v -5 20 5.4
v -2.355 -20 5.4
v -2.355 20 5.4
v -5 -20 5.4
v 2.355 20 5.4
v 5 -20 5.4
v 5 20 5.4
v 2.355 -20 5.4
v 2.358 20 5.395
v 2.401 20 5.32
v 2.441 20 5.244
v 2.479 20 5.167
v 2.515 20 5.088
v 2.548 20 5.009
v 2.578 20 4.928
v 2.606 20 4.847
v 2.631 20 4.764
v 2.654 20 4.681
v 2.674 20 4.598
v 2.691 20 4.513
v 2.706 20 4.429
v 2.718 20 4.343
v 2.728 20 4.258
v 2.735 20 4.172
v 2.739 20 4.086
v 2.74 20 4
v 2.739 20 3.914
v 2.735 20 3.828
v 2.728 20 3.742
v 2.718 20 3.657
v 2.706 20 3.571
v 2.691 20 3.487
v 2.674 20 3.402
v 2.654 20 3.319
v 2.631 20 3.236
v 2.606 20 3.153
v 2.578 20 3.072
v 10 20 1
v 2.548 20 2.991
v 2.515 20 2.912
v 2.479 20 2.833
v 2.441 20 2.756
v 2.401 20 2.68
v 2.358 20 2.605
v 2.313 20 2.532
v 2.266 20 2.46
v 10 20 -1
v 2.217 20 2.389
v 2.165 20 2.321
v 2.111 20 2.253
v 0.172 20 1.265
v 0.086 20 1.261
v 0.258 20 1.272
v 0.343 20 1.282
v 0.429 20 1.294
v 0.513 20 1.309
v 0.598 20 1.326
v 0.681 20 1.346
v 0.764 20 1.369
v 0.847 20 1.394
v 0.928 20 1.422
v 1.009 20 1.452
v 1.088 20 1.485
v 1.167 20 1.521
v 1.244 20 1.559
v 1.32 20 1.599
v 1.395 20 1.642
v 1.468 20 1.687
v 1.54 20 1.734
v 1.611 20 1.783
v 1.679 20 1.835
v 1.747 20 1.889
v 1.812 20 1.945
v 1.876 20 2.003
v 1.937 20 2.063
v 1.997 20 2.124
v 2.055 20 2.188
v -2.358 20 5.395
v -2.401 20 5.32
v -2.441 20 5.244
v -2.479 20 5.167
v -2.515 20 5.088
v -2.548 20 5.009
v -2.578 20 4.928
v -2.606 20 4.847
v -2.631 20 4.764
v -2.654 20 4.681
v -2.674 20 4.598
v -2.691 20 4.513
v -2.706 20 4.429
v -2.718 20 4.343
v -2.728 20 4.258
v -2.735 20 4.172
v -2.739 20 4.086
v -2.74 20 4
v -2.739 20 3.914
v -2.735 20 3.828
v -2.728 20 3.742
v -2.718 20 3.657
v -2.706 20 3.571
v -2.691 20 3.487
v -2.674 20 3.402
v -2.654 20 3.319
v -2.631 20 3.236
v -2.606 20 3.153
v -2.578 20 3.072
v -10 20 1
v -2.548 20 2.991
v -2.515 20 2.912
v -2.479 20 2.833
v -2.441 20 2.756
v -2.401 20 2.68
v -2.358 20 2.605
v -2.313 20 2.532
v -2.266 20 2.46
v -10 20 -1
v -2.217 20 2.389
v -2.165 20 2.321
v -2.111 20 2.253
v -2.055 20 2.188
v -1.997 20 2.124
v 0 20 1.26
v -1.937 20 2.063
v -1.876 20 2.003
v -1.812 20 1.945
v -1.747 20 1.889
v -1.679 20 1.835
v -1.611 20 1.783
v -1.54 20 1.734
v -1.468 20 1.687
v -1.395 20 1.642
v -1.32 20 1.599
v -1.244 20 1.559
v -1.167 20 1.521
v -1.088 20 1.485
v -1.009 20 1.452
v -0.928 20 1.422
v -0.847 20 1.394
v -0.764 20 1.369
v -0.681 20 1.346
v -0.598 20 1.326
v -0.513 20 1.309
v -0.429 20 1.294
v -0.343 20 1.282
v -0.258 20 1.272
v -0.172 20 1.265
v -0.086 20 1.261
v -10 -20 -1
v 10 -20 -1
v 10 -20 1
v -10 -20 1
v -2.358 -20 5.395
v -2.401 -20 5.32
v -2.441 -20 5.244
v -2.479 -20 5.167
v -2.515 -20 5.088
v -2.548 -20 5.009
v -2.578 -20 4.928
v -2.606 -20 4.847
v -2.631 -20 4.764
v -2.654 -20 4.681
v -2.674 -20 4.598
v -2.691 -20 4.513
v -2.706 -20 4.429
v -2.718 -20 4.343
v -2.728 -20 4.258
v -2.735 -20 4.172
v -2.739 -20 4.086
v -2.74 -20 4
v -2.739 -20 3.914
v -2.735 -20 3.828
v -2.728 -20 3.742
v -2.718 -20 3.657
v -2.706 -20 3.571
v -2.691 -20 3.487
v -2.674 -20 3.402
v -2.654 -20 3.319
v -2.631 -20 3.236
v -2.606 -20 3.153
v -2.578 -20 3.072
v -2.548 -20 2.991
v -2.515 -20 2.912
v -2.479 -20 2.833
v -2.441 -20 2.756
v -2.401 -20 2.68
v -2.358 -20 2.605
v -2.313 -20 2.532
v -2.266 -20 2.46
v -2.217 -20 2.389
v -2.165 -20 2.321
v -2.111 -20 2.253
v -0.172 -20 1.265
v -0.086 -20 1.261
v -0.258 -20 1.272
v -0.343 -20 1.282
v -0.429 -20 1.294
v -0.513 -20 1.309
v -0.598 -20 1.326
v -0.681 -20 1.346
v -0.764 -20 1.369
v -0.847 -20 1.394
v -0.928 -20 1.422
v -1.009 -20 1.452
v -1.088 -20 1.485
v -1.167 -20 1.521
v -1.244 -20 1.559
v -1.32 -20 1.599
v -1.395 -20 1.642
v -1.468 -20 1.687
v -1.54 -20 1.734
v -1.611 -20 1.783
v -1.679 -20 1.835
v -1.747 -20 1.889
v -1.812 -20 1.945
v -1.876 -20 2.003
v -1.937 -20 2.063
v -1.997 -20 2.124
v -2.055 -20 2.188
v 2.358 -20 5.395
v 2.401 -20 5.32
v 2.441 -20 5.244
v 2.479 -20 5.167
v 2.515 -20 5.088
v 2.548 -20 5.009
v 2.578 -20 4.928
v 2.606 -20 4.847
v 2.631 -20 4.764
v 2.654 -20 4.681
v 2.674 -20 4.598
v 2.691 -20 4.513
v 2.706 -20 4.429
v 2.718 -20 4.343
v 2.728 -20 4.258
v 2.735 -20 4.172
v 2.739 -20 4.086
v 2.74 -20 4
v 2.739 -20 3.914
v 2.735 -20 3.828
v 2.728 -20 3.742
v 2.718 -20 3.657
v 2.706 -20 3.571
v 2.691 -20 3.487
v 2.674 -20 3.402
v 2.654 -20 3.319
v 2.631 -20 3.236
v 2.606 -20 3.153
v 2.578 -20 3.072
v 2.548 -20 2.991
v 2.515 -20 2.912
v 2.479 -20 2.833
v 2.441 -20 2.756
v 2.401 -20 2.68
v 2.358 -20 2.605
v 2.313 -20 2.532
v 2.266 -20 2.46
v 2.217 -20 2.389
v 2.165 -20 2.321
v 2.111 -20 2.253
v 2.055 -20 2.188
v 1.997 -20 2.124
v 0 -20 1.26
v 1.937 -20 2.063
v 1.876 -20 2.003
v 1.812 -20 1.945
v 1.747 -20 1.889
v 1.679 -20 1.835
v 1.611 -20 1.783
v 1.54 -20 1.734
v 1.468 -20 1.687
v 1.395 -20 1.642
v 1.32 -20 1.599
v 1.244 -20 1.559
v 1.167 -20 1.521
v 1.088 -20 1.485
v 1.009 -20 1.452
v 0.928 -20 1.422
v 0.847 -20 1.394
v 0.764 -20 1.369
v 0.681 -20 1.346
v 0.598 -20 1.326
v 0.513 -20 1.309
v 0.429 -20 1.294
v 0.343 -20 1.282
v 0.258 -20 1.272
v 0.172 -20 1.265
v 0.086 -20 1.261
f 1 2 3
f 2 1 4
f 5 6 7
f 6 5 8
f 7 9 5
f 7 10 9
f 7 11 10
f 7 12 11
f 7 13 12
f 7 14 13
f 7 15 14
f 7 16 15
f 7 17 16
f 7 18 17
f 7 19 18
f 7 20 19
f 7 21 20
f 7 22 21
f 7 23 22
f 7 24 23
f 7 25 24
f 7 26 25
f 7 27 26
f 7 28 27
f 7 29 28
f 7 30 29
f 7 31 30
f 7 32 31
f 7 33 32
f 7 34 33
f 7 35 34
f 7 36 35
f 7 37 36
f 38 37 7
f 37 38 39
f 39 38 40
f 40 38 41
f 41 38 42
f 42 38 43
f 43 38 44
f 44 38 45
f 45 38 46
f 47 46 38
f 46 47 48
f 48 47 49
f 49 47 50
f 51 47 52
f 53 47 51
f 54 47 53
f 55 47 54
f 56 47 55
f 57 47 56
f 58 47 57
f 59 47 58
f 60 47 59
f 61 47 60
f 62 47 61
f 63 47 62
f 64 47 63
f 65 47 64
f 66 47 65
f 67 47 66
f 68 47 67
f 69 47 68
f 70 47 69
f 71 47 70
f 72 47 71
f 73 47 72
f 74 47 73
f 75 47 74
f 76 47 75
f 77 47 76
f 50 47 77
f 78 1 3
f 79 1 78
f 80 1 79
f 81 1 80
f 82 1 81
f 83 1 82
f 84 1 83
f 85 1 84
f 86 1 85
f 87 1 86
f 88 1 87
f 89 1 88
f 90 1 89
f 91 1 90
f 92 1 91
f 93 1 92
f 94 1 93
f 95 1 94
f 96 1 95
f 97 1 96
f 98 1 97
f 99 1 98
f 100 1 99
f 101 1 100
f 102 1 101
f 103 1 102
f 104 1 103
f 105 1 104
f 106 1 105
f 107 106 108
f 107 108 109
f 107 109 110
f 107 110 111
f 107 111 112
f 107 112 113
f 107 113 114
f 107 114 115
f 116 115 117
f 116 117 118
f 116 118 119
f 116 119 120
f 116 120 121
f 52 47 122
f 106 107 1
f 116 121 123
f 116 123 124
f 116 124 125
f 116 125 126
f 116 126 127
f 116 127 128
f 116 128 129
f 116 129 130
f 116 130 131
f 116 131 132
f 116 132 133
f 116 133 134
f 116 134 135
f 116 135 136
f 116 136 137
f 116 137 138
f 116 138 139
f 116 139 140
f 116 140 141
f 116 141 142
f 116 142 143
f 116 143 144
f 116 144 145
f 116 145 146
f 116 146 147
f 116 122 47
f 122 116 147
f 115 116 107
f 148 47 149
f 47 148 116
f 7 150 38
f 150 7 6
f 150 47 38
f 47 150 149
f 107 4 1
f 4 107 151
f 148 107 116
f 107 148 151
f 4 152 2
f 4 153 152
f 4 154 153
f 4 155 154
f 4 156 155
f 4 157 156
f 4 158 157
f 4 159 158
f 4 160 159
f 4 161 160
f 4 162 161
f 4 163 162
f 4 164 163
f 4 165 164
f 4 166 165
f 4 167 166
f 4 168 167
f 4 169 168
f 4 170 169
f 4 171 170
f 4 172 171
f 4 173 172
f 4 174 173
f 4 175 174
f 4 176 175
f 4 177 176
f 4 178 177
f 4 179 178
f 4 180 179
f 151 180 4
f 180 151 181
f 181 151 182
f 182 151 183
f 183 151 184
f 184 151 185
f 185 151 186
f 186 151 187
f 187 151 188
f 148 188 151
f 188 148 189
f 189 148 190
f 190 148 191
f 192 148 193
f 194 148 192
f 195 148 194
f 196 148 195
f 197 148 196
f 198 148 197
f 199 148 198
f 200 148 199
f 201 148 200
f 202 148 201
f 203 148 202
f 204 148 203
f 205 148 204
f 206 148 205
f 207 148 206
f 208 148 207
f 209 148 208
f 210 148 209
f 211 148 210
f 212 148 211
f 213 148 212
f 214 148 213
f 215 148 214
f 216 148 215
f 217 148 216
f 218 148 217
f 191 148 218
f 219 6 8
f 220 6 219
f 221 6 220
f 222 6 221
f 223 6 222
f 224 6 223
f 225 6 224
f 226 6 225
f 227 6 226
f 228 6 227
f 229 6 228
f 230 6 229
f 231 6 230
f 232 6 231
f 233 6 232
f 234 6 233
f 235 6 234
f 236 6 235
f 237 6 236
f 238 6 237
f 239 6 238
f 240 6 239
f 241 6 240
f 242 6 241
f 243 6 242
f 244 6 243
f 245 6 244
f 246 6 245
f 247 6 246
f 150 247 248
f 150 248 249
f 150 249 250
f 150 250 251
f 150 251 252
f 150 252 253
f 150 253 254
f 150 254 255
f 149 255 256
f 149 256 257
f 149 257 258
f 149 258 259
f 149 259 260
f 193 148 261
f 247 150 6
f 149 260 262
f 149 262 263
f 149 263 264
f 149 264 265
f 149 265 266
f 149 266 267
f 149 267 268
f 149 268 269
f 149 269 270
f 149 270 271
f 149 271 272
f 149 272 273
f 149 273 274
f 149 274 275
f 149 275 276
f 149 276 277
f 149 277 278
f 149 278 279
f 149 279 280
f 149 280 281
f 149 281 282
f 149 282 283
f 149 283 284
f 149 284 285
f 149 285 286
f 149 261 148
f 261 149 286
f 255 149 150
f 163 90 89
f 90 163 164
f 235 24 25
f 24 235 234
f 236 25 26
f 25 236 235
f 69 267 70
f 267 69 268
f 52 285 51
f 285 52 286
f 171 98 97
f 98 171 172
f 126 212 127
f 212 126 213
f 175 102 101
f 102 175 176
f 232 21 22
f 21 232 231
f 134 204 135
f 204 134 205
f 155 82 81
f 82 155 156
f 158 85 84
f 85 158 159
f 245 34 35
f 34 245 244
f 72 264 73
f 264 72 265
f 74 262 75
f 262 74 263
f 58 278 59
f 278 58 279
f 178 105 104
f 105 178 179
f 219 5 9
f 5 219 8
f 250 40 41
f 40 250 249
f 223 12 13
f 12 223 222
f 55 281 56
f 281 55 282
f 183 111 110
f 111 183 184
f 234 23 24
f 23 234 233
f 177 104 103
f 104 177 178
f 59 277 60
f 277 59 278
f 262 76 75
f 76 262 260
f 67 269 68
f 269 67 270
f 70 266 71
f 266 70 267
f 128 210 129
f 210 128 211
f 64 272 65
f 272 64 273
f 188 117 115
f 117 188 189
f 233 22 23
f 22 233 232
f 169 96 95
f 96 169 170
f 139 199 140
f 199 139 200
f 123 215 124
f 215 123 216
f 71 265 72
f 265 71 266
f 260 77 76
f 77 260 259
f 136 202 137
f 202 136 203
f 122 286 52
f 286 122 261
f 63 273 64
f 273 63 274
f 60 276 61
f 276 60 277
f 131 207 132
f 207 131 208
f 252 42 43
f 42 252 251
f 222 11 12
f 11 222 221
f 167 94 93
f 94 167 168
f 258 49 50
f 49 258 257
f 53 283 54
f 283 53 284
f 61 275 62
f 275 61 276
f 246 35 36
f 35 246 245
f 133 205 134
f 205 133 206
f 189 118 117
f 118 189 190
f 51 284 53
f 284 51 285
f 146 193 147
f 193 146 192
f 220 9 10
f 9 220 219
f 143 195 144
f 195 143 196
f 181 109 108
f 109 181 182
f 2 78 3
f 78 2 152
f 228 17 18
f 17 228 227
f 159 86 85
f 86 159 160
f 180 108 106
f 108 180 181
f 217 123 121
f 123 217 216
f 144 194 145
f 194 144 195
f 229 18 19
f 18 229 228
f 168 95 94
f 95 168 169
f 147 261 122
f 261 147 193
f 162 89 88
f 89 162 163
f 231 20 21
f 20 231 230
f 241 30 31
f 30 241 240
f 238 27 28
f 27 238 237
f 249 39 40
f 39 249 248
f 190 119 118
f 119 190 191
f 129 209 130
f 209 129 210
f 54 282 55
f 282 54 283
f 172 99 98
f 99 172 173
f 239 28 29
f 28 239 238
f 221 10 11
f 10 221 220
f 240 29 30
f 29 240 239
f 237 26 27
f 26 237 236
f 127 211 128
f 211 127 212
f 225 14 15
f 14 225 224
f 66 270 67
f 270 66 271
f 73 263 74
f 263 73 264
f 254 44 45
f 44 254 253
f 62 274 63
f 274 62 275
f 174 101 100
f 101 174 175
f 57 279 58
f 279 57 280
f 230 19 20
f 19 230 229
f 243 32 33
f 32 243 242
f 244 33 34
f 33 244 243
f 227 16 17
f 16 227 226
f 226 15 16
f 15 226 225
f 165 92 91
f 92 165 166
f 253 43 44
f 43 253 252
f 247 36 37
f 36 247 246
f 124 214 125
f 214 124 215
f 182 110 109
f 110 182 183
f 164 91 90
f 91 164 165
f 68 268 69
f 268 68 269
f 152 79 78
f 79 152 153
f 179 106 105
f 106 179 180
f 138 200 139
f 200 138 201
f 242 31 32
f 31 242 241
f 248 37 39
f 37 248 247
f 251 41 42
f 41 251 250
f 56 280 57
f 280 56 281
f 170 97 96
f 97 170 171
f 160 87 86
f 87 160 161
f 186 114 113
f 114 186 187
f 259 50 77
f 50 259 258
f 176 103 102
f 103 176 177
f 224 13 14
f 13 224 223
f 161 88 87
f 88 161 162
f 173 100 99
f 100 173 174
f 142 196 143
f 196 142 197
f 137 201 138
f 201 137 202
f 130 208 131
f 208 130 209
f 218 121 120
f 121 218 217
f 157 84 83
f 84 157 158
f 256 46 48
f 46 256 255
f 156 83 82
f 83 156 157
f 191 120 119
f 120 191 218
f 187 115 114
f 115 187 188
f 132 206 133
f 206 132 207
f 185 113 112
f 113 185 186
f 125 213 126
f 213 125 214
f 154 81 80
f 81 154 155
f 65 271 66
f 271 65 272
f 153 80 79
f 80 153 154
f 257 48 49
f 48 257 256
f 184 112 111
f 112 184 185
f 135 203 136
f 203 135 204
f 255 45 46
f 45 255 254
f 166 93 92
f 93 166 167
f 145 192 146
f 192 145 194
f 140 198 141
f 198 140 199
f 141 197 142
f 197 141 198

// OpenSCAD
oversize = 0.1;
resolution = 200.0;

module cat_cable(width, length, cable_width)
{
  difference()
  {
    // main structure
    hull()
    {
      cube([width, length, 2.0], center = true);
      translate([0.0, 0.0, 4.4])
        cube([10.0, length, 2.0], center = true);
    }

    // cutout for cable
    translate([0.0, 0.0, 4.0])
      rotate([90.0, 0.0, 0.0])
      cylinder(h = length + oversize, d = cable_width, $fn = resolution, center = true);
  }
}

module cat_5e(width, length)
{
  cat_cable(width = width, length = length, cable_width = 5.48);
}

module main()
{
  cat_5e(width = 20.0, length = 40.0);
}

main();
